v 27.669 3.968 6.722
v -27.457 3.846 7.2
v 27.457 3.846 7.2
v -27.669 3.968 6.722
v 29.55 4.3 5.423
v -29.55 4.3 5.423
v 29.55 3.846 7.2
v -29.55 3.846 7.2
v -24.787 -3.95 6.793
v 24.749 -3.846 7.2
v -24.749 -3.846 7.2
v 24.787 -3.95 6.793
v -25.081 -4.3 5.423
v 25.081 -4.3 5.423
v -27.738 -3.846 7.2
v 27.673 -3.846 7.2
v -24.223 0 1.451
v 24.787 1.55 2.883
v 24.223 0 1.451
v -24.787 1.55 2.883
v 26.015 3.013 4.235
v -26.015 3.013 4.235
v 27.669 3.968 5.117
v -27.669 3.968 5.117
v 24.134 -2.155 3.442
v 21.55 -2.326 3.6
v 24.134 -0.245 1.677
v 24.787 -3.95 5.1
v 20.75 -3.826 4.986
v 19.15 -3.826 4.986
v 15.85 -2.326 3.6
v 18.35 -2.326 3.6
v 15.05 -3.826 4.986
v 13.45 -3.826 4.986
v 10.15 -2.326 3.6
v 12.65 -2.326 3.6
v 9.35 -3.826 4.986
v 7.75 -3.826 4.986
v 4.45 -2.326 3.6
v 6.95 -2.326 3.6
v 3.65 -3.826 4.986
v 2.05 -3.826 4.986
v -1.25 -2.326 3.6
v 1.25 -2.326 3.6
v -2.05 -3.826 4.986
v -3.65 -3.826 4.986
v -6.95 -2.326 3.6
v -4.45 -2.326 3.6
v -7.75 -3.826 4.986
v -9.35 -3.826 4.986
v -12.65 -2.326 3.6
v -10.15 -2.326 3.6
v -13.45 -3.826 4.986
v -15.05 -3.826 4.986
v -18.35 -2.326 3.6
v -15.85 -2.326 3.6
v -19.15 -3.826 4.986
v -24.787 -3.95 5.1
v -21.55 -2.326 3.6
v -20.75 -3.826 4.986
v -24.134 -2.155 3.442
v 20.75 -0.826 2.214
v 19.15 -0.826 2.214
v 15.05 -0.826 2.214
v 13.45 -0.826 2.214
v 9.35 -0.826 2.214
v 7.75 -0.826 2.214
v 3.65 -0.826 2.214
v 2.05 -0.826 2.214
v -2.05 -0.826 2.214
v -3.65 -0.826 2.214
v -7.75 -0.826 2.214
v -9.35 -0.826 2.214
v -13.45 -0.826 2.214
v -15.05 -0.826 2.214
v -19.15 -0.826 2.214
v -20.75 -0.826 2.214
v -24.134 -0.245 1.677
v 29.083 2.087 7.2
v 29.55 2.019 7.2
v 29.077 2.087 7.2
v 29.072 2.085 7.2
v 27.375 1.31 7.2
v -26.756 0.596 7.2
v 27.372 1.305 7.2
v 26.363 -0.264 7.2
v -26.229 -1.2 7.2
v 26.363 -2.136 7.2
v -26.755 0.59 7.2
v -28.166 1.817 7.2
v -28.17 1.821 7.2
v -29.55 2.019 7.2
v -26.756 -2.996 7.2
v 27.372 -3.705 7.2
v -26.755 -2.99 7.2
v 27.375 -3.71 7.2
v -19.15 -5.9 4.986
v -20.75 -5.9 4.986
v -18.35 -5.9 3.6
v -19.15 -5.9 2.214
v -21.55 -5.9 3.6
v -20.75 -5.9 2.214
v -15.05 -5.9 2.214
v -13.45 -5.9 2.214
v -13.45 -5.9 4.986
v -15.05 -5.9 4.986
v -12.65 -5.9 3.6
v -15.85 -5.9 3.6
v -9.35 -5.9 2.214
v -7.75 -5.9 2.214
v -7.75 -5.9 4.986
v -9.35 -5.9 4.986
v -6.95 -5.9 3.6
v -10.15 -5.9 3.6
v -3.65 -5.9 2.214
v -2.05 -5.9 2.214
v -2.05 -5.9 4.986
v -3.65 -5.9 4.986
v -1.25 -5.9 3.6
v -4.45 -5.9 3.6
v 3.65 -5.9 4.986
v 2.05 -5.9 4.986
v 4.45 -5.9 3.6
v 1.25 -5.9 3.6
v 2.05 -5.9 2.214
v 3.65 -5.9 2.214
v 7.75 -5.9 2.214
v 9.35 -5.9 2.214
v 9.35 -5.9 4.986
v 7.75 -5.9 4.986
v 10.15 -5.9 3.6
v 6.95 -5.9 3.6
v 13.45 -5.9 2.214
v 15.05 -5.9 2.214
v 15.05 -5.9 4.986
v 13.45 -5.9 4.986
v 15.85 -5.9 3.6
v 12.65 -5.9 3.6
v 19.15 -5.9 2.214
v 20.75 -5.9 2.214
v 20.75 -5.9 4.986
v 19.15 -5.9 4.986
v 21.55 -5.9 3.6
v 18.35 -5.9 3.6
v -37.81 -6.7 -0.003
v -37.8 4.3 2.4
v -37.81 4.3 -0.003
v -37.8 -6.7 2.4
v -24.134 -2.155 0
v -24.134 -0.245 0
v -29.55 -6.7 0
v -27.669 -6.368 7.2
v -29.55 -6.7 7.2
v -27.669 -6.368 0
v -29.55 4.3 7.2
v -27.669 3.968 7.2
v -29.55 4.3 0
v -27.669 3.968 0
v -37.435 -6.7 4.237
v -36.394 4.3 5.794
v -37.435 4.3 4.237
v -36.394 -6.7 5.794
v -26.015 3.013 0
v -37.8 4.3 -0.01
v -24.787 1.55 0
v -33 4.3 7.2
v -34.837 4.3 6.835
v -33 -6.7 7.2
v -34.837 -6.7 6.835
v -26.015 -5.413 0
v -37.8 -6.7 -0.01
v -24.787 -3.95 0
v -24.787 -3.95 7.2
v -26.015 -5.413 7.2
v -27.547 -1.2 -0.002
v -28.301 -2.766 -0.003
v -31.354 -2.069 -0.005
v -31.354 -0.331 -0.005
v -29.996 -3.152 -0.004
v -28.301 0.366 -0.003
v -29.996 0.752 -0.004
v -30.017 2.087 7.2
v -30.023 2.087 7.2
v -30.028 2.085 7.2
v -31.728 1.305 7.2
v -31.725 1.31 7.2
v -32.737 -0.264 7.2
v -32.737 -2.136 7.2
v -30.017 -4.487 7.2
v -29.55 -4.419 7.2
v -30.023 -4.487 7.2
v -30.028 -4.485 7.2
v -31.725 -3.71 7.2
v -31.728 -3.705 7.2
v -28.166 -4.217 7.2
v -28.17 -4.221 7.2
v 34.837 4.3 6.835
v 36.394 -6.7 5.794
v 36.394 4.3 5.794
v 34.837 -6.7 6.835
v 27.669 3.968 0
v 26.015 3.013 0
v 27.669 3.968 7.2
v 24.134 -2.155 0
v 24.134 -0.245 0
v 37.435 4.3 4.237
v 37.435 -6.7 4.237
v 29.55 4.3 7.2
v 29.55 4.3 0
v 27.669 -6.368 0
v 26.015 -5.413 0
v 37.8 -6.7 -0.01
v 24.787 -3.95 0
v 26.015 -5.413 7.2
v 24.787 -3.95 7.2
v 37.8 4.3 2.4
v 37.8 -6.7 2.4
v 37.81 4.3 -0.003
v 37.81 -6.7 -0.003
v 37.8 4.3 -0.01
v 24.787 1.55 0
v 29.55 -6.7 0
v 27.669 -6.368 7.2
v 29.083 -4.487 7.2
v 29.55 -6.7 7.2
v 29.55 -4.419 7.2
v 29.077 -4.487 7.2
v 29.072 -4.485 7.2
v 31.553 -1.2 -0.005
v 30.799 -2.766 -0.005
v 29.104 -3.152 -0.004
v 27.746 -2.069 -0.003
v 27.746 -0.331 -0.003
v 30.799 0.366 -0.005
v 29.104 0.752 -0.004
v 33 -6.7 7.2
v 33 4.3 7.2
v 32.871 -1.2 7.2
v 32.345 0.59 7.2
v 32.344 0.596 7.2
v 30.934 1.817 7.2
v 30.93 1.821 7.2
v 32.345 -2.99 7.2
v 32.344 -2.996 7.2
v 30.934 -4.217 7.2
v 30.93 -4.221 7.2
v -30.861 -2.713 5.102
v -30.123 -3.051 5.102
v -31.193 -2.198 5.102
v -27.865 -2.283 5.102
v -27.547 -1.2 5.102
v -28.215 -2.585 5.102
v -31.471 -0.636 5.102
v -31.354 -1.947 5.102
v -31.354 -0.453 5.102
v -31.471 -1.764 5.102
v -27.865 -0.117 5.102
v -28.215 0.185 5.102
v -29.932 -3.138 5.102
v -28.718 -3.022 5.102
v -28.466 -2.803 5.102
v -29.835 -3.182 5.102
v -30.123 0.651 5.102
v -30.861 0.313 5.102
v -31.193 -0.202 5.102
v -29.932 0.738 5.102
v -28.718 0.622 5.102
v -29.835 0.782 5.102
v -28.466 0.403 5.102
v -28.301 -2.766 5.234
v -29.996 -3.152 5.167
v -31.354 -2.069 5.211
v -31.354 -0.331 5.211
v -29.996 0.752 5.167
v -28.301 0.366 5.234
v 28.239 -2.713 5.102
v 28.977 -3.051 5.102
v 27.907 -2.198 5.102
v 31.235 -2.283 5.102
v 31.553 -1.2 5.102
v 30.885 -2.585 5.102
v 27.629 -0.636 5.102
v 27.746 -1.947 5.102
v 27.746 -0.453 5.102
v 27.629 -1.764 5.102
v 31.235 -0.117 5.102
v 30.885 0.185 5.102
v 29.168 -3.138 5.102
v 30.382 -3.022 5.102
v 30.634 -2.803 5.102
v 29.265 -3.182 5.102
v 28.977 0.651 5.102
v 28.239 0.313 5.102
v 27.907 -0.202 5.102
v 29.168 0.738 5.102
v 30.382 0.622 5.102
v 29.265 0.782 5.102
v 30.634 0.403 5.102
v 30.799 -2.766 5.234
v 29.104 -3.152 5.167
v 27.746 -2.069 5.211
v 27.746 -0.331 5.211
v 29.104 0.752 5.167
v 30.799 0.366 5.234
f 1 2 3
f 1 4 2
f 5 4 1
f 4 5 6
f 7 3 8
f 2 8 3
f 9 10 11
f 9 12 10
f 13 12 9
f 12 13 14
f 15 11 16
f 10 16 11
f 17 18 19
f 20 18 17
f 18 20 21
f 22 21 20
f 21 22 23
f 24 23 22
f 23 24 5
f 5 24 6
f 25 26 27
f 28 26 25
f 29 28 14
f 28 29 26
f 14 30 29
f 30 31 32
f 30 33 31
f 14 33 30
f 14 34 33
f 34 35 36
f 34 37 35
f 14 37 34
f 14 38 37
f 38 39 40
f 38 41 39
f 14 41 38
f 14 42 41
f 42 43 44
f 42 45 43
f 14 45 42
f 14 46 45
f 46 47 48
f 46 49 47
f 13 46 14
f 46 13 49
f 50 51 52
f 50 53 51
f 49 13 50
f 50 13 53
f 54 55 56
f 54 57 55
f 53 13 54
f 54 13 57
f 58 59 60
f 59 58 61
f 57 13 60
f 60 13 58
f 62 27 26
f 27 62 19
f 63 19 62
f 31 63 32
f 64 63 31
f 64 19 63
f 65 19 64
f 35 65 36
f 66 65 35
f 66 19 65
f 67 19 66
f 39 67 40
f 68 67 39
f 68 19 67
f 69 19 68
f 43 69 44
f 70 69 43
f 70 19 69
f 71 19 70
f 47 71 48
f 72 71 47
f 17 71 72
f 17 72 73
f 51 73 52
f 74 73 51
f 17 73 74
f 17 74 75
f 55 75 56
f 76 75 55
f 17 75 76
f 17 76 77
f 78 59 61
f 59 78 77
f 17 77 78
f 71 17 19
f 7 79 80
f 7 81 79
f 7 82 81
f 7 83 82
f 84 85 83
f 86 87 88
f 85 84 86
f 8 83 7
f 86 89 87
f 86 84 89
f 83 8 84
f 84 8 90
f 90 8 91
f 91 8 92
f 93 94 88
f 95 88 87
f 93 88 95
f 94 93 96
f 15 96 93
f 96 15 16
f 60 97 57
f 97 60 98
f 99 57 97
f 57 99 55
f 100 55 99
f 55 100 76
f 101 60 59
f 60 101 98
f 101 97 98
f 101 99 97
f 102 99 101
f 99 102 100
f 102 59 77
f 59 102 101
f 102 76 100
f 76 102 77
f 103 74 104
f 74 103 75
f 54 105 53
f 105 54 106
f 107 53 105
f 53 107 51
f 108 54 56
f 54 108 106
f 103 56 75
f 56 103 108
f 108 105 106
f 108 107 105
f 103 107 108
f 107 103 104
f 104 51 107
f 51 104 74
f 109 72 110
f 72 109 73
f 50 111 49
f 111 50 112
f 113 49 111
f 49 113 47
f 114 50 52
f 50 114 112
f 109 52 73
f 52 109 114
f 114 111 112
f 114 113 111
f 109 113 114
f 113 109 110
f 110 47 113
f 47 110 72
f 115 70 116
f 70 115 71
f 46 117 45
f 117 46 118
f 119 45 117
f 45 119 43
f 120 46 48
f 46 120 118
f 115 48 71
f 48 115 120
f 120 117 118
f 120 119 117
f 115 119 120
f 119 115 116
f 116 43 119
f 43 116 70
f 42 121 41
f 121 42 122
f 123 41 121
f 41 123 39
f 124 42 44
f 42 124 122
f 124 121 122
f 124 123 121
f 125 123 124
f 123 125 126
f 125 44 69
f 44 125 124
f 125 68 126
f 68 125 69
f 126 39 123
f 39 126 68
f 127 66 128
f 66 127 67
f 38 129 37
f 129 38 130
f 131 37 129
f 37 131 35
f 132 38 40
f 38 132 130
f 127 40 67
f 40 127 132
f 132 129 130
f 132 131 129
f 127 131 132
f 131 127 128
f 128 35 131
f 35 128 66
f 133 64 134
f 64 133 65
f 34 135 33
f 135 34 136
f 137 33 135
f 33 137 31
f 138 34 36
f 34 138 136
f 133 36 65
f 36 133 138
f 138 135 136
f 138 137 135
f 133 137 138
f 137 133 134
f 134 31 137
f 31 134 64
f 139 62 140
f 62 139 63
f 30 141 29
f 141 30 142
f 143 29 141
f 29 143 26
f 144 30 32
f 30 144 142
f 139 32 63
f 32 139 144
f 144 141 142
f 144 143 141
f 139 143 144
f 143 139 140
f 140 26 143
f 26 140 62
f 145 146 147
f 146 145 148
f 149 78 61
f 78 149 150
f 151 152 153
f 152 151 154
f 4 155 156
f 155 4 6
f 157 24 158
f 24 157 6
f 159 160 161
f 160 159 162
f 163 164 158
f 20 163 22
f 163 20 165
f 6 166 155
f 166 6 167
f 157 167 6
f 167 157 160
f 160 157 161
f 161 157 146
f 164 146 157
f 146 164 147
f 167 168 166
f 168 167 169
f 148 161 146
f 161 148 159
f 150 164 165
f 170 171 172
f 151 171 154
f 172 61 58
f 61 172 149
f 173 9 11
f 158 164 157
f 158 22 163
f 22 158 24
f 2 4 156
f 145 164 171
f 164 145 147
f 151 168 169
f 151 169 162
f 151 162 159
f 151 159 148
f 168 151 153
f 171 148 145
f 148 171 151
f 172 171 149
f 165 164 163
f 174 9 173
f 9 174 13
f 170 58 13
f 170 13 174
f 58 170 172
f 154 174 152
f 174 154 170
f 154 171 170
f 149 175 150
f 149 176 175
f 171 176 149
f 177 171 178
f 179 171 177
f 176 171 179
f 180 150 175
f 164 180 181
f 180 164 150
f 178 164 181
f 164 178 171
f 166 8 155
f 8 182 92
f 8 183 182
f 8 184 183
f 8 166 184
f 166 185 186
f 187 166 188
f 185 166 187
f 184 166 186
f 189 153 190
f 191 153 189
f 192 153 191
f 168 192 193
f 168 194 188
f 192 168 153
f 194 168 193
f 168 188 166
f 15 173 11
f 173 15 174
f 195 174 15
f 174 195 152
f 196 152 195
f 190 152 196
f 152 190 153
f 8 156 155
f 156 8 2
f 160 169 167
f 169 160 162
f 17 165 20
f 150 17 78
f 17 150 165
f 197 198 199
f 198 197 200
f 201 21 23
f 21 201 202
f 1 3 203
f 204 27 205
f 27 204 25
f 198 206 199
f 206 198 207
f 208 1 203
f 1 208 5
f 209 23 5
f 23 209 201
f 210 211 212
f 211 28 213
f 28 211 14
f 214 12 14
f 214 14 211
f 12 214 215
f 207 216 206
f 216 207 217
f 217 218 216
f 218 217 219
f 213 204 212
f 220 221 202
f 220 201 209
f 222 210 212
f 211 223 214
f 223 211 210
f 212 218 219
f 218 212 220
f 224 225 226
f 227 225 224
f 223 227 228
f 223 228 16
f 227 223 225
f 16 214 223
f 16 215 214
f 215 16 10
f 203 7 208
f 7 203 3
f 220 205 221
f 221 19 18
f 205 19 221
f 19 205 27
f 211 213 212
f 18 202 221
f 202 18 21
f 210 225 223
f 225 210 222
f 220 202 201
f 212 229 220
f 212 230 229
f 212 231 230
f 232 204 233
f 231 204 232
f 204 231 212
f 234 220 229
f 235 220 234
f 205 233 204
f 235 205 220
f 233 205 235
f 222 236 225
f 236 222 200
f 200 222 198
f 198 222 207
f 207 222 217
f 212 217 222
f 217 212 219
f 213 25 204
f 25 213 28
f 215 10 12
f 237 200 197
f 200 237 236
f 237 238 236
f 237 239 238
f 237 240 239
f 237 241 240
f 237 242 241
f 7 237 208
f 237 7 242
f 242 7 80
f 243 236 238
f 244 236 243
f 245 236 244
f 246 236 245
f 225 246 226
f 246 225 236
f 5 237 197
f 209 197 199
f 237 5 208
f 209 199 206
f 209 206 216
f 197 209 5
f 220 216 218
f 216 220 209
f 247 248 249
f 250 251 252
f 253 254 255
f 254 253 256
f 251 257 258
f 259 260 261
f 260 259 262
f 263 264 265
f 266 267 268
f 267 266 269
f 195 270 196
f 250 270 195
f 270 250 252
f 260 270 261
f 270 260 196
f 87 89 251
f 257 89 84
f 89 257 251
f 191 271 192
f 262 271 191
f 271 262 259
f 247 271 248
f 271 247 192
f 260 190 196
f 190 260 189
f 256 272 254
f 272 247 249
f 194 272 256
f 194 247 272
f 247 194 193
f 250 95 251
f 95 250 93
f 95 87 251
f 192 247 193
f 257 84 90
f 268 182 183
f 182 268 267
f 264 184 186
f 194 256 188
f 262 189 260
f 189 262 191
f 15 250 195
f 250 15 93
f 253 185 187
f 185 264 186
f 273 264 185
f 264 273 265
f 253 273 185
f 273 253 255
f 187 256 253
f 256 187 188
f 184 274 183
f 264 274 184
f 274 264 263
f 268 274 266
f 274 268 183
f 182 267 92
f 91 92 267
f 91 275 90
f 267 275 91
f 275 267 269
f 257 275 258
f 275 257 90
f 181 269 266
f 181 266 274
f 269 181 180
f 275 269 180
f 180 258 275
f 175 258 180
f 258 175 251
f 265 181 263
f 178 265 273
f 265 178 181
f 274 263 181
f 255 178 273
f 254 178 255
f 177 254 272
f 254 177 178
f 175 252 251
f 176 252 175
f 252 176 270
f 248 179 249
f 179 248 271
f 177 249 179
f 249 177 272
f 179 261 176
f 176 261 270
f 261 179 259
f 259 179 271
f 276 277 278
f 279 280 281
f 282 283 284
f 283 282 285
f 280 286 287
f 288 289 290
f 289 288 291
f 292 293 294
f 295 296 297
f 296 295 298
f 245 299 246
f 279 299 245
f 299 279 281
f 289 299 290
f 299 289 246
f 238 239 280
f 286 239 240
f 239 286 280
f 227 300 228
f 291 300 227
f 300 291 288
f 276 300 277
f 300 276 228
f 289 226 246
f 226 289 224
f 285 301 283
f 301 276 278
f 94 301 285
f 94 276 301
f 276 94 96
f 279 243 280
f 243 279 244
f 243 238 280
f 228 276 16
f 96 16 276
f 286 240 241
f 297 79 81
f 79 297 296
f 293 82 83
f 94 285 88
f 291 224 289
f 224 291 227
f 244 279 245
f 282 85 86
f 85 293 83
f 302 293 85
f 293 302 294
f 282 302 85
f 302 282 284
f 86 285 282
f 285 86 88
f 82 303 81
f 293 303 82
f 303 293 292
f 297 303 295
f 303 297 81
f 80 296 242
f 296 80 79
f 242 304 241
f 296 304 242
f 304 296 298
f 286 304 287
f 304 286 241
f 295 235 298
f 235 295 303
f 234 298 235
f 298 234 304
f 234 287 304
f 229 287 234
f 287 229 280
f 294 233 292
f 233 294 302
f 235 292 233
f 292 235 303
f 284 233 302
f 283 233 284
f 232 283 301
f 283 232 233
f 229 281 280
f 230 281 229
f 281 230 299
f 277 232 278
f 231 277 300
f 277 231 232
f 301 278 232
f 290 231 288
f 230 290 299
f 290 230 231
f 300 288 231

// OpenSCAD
// file: curvy_block.scad
module quarter_cylinder(
  r = 1,
  h = 1,
  q = 0
) {
  intersection() {
    cylinder(r=r, h=h, center=true);

    translate([0, 0, h/-2]) {
      rotate(90*q) {
        cube(size=[r, r, h]);
      }
    }
  }
}

module curvy_block(
  size=[1, 1, 1],
  r1 = 0,
  r2 = 0,
  r3 = 0,
  r4 = 0,
) {
  hull() {
    translate([size[0]/-2+r1, size[1]/2-r1, 0]) {
      quarter_cylinder(r=max(0.01, r1), h=size[2], q=1);
    }

    translate([size[0]/2-r2, size[1]/2-r2, 0]) {
      quarter_cylinder(r=max(0.01, r2), h=size[2], q=0);
    }

    translate([0, size[1]/-2+r3, size[2]/2-r3]) {
      rotate([0, 90, 0]) {
        quarter_cylinder(r=max(0.01, r3), h=size[0], q=2);
      }
    }

    translate([0, size[1]/-2+r4, size[2]/-2+r4]) {
      rotate([0, 90, 0]) {
        quarter_cylinder(r=max(0.01, r4), h=size[0], q=3);
      }
    }
  }
}
// main file
use <curvy_block.scad>;

module tailpiece(
  leg_d = 11,
  pins = 8,
  clearance = 2,
  pin_h = 2.4,
  pin_d = 3.2,
  pin_spacing = 2.5,
  // #6 wood screw:
  screw_d = 3.5052+0.5,
  screw_head_d = 6.6548,
  screw_head_h = 2.1082,
) {
  tailpiece_w = pins*pin_d+(pins+1)*pin_spacing;
  overall_h = pin_d+clearance*2;
  full_pin_h = (leg_d-pin_h)/2+pin_h-pin_d/4;

  translate([0, 0, overall_h/2]) {
    difference() {
      union() {
        // Half-round bar
        translate([0, 0, pin_d/-2]) {
          difference() {
            translate([0, 0, pin_d+clearance]) {
              resize([tailpiece_w+leg_d, leg_d-pin_h, (pin_d+clearance)*2]) {
                rotate([0, 90]) {
                  cylinder(d=1, h=1, center=true);
                }
              }
            }

            translate([0, 0, (pin_d+clearance)*1.5]) {
              cube(size=[tailpiece_w+leg_d+0.02, leg_d-pin_h+0.02, pin_d+clearance], center=true);
            }
          }
        }

        // Pins
        for (i=[(pins-1)/-2:(pins-1)/2]) {
          translate([i*(pin_d+pin_spacing), 0, 0]) {
            rotate([90, 0]) {
              cylinder(d=pin_d, h=full_pin_h);
            }
          }
        }

        // Legs
        for (i=[-2, 2]) {
          translate([(tailpiece_w+leg_d*1.25)/i, pin_h/-2, 0]) {
            rotate(90*i/2) {
              curvy_block(size=[leg_d, leg_d*1.25, overall_h], r1=leg_d/2, r2=leg_d/2, r3=overall_h*2/3, r4=0);
            }
          }
        }
      }

      // Screw holes
      translate([0, pin_h/-2, 0]) {
        for (i=[-2, 2]) {
          translate([(tailpiece_w+leg_d)/i, 0, 0]) {
            translate([0, 0, (overall_h-screw_head_h)/2+0.01]) {
              cylinder(d1=screw_d, d2=screw_head_d, h=screw_head_h, center=true);
            }

            cylinder(d=screw_d, h=overall_h+0.02, center=true);
          }
        }
      }
    }
  }
}

tailpiece();
